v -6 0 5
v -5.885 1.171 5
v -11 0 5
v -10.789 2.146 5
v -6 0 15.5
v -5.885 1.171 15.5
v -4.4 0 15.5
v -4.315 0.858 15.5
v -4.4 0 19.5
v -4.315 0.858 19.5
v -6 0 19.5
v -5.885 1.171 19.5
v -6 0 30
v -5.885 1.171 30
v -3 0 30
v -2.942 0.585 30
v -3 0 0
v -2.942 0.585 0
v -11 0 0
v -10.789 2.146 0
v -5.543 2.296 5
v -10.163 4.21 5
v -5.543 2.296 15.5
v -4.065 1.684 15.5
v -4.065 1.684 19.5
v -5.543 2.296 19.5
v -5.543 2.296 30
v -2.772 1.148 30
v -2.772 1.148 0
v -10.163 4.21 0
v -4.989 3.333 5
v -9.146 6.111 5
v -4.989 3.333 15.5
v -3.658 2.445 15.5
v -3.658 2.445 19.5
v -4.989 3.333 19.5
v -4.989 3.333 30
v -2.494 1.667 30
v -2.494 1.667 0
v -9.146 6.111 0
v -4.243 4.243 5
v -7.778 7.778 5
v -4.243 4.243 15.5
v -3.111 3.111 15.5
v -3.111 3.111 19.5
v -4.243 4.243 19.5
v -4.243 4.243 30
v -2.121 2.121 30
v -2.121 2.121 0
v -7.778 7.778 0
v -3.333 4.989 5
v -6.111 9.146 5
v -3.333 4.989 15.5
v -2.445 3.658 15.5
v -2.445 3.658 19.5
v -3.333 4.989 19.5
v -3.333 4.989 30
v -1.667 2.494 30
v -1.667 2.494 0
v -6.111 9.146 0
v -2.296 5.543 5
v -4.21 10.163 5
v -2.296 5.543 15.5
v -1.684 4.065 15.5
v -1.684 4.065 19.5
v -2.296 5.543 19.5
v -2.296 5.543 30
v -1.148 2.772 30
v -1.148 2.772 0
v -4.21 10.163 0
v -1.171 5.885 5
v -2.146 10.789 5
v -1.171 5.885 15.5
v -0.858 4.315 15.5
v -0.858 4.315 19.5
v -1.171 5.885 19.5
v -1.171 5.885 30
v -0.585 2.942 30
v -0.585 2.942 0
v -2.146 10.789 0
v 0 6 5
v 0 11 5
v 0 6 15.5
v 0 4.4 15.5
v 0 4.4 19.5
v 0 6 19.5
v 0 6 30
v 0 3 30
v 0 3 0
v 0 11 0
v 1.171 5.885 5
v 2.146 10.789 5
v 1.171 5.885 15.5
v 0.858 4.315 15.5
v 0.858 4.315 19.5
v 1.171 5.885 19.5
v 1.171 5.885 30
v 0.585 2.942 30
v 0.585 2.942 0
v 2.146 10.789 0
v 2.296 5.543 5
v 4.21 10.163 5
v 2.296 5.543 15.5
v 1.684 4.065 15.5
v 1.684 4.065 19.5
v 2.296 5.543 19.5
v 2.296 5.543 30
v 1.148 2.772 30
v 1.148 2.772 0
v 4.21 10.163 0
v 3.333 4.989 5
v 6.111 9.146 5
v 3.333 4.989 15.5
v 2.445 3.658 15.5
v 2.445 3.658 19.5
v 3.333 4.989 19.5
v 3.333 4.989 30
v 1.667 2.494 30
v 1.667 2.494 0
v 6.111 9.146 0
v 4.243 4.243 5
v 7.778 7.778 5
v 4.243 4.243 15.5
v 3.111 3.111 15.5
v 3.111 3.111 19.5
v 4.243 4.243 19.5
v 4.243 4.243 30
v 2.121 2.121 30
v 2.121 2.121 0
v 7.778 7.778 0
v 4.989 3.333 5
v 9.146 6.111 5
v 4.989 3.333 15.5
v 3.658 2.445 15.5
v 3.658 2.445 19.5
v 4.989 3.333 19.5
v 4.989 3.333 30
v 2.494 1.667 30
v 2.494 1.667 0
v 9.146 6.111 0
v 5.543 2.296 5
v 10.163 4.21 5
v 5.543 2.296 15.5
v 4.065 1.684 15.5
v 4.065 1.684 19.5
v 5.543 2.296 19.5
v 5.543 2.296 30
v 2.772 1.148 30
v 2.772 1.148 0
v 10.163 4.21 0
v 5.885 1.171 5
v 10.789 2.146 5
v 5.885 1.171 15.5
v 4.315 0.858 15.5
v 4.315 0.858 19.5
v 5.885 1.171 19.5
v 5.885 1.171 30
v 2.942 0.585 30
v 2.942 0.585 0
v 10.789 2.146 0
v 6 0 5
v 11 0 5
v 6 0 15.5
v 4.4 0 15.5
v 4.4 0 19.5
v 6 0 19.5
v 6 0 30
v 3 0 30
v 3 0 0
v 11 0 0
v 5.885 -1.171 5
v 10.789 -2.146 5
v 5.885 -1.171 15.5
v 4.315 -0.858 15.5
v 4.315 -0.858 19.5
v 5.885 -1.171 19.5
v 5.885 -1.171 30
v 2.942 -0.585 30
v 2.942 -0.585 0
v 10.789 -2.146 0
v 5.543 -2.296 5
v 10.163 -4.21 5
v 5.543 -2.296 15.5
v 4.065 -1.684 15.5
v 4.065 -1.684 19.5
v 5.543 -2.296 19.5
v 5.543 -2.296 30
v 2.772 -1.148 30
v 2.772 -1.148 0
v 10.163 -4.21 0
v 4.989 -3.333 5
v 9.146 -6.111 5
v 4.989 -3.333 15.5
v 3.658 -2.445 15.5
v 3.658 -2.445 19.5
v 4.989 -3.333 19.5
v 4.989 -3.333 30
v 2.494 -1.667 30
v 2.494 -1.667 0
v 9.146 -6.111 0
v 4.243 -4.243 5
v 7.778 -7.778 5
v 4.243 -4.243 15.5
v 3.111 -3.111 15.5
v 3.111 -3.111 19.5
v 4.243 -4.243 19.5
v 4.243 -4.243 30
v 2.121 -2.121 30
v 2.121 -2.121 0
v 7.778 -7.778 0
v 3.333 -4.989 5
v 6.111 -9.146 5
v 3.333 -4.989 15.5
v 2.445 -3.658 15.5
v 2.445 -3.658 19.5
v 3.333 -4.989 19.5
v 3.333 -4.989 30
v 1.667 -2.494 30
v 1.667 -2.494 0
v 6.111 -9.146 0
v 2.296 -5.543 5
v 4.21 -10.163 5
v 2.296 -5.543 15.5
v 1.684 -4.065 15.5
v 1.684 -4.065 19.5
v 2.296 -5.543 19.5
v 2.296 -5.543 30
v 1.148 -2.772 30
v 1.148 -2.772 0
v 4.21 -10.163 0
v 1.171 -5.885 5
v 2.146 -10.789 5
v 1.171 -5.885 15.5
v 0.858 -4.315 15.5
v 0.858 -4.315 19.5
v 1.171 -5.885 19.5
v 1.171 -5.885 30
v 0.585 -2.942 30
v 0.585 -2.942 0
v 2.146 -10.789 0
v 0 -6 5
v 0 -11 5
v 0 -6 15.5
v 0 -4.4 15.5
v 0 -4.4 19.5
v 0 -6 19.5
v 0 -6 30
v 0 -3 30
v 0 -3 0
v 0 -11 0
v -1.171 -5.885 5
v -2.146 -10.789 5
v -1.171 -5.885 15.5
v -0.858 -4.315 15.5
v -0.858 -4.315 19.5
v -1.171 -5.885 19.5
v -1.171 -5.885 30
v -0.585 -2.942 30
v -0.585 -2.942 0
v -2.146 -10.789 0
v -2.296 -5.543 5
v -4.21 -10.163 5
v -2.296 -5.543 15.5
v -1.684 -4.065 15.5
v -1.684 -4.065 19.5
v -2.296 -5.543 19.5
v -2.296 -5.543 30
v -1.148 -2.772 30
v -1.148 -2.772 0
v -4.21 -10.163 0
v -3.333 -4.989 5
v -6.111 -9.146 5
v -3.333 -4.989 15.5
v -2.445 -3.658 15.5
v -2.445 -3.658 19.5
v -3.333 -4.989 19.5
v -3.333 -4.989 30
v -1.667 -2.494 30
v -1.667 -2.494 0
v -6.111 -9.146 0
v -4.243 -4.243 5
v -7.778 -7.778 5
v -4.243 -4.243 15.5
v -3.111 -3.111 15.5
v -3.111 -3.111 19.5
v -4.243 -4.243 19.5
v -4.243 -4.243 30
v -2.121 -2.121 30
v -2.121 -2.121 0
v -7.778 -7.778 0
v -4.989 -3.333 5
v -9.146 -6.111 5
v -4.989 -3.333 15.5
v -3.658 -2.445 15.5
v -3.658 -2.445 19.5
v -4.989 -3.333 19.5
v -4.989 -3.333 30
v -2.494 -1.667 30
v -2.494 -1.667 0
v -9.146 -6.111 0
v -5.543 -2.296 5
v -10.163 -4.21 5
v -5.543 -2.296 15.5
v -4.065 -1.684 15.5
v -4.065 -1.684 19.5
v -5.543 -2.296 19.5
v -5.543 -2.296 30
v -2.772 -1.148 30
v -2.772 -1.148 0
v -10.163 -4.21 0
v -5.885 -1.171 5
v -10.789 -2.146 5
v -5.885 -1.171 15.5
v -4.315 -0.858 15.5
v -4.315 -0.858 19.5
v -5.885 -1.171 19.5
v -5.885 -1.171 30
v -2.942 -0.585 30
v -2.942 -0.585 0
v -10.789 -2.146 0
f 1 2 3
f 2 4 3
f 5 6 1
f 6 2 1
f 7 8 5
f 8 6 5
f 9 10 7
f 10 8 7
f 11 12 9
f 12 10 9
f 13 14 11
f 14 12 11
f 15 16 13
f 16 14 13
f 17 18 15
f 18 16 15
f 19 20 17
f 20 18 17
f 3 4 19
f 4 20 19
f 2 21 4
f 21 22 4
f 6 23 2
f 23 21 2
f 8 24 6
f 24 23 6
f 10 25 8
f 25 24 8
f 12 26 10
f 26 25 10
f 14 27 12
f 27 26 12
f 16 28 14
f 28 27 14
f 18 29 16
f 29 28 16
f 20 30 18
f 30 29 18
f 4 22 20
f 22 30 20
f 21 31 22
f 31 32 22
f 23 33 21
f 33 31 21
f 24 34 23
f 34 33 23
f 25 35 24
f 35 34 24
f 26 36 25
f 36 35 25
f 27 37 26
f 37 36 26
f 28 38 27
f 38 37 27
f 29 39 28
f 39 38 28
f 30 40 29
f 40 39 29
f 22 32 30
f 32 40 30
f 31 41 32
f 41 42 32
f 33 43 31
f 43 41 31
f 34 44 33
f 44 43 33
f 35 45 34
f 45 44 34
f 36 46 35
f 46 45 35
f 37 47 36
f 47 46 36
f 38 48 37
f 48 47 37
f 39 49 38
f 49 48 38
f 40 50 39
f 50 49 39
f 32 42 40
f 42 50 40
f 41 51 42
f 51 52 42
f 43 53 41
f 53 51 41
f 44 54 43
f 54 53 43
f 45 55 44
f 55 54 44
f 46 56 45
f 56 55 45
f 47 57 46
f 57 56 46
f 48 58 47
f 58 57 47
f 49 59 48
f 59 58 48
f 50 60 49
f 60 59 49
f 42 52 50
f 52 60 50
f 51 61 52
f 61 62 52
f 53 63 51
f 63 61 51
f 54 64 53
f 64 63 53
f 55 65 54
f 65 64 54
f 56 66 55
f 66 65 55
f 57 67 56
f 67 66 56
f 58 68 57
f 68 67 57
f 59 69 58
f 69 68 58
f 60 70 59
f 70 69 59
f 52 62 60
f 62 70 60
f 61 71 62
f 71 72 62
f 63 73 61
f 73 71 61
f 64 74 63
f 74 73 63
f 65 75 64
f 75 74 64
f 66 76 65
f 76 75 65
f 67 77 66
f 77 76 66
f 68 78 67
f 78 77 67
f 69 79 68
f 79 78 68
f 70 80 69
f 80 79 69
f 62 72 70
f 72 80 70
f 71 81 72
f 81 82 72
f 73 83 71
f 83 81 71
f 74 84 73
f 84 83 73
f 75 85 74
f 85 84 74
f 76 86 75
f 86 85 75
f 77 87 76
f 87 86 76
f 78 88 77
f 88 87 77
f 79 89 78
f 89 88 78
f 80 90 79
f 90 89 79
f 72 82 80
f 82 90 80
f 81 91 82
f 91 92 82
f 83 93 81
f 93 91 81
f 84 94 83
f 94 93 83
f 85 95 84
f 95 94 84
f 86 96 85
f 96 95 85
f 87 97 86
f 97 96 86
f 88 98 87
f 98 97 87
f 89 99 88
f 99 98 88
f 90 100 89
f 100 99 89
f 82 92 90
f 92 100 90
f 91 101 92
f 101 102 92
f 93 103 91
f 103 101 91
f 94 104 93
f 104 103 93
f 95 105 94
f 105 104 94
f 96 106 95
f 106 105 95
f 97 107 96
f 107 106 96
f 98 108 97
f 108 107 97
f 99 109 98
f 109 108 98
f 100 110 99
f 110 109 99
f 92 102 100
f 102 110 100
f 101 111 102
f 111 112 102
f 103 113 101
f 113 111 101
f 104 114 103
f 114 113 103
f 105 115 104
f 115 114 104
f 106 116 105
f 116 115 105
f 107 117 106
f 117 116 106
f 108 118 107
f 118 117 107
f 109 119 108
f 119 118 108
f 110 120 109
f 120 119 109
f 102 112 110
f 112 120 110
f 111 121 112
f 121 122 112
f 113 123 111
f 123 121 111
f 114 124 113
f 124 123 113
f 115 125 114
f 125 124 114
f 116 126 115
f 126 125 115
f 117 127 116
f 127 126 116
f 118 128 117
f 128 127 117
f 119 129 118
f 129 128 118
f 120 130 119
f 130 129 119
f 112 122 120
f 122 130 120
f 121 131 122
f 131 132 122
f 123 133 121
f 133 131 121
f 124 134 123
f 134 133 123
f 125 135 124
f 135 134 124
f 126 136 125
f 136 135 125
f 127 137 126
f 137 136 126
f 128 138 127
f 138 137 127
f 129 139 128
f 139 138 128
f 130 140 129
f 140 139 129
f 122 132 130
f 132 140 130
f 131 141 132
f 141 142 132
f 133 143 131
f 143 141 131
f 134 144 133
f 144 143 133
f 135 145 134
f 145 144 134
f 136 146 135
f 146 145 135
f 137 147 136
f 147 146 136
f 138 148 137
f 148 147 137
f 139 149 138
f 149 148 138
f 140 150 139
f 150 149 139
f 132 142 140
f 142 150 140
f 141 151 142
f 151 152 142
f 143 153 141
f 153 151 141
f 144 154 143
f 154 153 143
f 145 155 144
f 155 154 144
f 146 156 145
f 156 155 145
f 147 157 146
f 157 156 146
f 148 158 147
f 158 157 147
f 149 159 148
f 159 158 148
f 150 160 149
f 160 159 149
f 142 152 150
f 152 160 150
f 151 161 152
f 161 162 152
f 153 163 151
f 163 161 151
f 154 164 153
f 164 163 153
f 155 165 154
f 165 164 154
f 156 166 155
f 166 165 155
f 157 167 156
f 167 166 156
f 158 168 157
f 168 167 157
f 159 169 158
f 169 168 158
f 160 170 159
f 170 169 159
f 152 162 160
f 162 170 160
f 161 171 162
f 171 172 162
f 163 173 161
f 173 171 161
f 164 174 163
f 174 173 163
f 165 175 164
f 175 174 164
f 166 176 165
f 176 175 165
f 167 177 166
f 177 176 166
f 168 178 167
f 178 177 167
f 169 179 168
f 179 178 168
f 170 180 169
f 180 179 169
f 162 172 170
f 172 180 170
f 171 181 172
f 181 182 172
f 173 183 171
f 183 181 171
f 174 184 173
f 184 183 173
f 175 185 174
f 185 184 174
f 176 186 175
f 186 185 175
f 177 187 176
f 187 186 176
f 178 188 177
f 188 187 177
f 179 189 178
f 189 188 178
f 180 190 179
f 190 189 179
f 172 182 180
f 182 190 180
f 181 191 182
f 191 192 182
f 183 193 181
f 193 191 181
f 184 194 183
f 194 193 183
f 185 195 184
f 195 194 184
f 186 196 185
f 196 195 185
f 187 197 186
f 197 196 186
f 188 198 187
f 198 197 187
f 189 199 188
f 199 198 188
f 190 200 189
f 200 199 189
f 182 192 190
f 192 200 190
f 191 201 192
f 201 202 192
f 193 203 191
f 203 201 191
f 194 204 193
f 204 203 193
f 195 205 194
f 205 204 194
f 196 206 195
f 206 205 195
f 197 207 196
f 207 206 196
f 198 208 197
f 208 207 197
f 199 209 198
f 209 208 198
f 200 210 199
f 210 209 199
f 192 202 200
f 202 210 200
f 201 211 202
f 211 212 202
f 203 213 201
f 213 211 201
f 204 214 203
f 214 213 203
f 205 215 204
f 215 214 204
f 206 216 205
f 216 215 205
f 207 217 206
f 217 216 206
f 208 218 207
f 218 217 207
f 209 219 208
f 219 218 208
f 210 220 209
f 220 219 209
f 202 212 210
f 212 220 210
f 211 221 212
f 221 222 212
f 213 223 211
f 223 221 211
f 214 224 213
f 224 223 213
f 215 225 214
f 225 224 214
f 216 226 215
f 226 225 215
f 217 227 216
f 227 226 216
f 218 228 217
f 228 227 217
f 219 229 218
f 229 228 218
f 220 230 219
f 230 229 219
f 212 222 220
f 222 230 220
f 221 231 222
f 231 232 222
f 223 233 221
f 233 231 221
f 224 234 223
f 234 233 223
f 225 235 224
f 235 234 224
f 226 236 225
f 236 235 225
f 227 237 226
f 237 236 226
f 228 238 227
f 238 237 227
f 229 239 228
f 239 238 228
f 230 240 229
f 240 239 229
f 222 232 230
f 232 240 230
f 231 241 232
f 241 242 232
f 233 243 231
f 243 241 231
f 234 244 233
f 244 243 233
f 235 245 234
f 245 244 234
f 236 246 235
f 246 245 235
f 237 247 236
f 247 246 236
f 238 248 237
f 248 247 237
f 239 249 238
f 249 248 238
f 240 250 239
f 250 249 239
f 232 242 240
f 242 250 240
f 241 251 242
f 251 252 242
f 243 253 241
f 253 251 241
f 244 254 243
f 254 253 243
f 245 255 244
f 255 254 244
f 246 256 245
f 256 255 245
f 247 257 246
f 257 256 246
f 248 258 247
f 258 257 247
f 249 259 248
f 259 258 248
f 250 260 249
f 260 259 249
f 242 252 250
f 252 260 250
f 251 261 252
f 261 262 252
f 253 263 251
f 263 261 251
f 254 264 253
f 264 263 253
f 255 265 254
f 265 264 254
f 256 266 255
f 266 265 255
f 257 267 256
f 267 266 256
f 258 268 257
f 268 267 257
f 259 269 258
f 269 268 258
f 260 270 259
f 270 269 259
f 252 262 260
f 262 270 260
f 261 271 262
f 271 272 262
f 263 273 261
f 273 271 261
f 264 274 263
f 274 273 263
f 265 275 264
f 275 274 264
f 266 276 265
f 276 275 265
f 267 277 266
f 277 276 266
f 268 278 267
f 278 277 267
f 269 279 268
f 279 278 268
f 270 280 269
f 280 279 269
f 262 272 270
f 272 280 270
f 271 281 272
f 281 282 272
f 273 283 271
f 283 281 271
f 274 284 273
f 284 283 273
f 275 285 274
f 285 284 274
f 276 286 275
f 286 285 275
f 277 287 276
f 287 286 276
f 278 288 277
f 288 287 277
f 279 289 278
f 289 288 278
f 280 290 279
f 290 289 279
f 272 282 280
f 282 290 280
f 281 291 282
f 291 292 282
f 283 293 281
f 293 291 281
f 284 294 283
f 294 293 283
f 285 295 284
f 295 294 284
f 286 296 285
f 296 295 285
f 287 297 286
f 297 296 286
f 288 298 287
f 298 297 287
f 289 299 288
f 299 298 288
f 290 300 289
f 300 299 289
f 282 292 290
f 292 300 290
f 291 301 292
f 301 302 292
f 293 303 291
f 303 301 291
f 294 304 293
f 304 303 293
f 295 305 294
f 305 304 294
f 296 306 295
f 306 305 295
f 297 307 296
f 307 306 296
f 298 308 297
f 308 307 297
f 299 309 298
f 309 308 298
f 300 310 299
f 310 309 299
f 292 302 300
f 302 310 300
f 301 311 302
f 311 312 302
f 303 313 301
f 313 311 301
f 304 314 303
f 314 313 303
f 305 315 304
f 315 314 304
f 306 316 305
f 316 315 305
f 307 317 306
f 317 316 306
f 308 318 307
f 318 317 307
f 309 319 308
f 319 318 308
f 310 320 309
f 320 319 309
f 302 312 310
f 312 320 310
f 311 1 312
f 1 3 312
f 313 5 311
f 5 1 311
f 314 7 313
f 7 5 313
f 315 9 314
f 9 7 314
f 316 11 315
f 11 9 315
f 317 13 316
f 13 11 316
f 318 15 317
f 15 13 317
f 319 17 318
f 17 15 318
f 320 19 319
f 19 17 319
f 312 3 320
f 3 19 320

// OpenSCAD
$fn = 32;

// ----------------------------------------------------------------------
// Grooved revolve: flanged, bore R3
// ----------------------------------------------------------------------

// --- parameters (mm) ---
bore_r = 3;               // bore radius
outer_r = 6;              // outer radius of the body
total_h = 30;             // overall height, Z
wall = 3;                 // radial wall thickness
groove_w = 4;             // groove width
groove_d = 1.6;           // groove depth
grooves = 1;              // number of outer grooves
flange_r = 11;            // flange radius
flange_h = 5;             // flange height

bbox_x = 2 * flange_r;  // full diameter
bore_d = 2 * bore_r;  // bore diameter
body_d = 2 * outer_r;  // body diameter
flange_d = 2 * flange_r;  // flange diameter
revolve_angle = 360;  // full turn around the Z axis

profile = [[3, 0], [6, 0], [11, 0], [11, 5], [6, 5], [6, 15.5], [4.4, 15.5], [4.4, 19.5], [6, 19.5], [6, 30], [3, 30]];  // primary outline, 11 points, counter clockwise

// --- the one profile operation ---
rotate_extrude(angle = revolve_angle) polygon(points = profile);
